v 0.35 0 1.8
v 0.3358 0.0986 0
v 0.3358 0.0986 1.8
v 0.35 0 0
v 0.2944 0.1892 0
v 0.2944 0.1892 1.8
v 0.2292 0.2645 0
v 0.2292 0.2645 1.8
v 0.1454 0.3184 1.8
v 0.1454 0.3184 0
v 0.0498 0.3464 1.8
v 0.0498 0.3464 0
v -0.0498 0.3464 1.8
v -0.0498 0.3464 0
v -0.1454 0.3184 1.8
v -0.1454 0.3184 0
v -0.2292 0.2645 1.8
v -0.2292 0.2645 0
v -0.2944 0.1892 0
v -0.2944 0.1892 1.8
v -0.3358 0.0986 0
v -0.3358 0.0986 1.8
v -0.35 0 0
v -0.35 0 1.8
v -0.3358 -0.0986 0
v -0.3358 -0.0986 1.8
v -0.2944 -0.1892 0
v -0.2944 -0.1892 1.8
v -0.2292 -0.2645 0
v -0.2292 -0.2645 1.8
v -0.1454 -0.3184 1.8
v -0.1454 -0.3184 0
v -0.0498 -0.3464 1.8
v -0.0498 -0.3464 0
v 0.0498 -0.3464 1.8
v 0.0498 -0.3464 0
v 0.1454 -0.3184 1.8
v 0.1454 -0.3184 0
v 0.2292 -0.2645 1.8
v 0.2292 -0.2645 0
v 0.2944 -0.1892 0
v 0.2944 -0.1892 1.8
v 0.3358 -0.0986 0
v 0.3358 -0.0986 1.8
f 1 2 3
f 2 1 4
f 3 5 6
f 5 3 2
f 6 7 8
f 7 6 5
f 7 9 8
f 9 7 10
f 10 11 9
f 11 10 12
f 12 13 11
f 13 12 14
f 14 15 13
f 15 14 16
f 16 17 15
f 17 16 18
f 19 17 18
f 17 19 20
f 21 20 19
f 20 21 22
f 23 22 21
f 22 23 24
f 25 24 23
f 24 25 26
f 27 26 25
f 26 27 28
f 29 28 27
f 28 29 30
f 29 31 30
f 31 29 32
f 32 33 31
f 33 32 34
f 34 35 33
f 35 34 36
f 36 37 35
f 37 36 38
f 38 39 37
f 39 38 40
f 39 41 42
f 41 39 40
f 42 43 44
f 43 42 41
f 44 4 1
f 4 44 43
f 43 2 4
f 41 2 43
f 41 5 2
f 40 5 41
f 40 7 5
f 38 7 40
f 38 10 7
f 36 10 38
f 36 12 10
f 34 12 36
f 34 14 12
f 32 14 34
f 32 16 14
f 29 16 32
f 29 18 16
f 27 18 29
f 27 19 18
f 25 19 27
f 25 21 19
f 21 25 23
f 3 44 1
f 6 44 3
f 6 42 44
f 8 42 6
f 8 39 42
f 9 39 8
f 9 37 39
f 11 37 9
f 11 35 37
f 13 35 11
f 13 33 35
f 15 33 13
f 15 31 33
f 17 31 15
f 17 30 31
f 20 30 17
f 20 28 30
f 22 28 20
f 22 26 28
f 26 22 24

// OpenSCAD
$fn = 0;    //número de fragmentos
$fa = 4;    //ángulo mínimo
$fs = 0.1;  //tamaño mínimo
offset = 0.001;
radioTubo = 13;
diametroTubo = 26; //25 en realidad, 1mm de margen
grosorTop = 2;
grosorBottom = 2;
altura = 7;
separacionEntreAros = 1;

piezaParaMostrar = 1;

if(piezaParaMostrar == 0){
    semiArandelaConHuecos();
    }
if(piezaParaMostrar == 1){
    tacoMacho();
    }


module semiArandelaConHuecos(){
    difference(){
        arandela();
        translate([0,-20,-offset])
        cube([20,40,10]);
        
        translate([-1,-16.4,1.5])
        tacoHembra();
        translate([-1,14.8,5])
        tacoHembra();
        translate([-1,-14.8,5])
        tacoHembra();
        translate([-1,16.4,1.5])
        tacoHembra();
        }
    }

//Multiplicar por 2 cada medida, uno por cada lado
module arandela(){
        difference(){
        cylinder(   altura, 
                    d1 = diametroTubo + (grosorBottom * 2) + (grosorTop * 2) + (separacionEntreAros * 2),
                    d2 = diametroTubo + (grosorTop * 2));
            
        translate([0,0,-offset])
        cylinder(   altura + (offset * 2),
                    d1 = diametroTubo + (grosorBottom * 2) + (separacionEntreAros * 2),
                    d2 = diametroTubo);
        }
    }

module tacoHembra(){
    rotate([0,90,0])
    taco(2, 0.75);
    }

module tacoMacho(){
    taco(1.8, 0.7);
    }

module taco(largo, diametro){
    cylinder(largo, d = diametro);
    }
